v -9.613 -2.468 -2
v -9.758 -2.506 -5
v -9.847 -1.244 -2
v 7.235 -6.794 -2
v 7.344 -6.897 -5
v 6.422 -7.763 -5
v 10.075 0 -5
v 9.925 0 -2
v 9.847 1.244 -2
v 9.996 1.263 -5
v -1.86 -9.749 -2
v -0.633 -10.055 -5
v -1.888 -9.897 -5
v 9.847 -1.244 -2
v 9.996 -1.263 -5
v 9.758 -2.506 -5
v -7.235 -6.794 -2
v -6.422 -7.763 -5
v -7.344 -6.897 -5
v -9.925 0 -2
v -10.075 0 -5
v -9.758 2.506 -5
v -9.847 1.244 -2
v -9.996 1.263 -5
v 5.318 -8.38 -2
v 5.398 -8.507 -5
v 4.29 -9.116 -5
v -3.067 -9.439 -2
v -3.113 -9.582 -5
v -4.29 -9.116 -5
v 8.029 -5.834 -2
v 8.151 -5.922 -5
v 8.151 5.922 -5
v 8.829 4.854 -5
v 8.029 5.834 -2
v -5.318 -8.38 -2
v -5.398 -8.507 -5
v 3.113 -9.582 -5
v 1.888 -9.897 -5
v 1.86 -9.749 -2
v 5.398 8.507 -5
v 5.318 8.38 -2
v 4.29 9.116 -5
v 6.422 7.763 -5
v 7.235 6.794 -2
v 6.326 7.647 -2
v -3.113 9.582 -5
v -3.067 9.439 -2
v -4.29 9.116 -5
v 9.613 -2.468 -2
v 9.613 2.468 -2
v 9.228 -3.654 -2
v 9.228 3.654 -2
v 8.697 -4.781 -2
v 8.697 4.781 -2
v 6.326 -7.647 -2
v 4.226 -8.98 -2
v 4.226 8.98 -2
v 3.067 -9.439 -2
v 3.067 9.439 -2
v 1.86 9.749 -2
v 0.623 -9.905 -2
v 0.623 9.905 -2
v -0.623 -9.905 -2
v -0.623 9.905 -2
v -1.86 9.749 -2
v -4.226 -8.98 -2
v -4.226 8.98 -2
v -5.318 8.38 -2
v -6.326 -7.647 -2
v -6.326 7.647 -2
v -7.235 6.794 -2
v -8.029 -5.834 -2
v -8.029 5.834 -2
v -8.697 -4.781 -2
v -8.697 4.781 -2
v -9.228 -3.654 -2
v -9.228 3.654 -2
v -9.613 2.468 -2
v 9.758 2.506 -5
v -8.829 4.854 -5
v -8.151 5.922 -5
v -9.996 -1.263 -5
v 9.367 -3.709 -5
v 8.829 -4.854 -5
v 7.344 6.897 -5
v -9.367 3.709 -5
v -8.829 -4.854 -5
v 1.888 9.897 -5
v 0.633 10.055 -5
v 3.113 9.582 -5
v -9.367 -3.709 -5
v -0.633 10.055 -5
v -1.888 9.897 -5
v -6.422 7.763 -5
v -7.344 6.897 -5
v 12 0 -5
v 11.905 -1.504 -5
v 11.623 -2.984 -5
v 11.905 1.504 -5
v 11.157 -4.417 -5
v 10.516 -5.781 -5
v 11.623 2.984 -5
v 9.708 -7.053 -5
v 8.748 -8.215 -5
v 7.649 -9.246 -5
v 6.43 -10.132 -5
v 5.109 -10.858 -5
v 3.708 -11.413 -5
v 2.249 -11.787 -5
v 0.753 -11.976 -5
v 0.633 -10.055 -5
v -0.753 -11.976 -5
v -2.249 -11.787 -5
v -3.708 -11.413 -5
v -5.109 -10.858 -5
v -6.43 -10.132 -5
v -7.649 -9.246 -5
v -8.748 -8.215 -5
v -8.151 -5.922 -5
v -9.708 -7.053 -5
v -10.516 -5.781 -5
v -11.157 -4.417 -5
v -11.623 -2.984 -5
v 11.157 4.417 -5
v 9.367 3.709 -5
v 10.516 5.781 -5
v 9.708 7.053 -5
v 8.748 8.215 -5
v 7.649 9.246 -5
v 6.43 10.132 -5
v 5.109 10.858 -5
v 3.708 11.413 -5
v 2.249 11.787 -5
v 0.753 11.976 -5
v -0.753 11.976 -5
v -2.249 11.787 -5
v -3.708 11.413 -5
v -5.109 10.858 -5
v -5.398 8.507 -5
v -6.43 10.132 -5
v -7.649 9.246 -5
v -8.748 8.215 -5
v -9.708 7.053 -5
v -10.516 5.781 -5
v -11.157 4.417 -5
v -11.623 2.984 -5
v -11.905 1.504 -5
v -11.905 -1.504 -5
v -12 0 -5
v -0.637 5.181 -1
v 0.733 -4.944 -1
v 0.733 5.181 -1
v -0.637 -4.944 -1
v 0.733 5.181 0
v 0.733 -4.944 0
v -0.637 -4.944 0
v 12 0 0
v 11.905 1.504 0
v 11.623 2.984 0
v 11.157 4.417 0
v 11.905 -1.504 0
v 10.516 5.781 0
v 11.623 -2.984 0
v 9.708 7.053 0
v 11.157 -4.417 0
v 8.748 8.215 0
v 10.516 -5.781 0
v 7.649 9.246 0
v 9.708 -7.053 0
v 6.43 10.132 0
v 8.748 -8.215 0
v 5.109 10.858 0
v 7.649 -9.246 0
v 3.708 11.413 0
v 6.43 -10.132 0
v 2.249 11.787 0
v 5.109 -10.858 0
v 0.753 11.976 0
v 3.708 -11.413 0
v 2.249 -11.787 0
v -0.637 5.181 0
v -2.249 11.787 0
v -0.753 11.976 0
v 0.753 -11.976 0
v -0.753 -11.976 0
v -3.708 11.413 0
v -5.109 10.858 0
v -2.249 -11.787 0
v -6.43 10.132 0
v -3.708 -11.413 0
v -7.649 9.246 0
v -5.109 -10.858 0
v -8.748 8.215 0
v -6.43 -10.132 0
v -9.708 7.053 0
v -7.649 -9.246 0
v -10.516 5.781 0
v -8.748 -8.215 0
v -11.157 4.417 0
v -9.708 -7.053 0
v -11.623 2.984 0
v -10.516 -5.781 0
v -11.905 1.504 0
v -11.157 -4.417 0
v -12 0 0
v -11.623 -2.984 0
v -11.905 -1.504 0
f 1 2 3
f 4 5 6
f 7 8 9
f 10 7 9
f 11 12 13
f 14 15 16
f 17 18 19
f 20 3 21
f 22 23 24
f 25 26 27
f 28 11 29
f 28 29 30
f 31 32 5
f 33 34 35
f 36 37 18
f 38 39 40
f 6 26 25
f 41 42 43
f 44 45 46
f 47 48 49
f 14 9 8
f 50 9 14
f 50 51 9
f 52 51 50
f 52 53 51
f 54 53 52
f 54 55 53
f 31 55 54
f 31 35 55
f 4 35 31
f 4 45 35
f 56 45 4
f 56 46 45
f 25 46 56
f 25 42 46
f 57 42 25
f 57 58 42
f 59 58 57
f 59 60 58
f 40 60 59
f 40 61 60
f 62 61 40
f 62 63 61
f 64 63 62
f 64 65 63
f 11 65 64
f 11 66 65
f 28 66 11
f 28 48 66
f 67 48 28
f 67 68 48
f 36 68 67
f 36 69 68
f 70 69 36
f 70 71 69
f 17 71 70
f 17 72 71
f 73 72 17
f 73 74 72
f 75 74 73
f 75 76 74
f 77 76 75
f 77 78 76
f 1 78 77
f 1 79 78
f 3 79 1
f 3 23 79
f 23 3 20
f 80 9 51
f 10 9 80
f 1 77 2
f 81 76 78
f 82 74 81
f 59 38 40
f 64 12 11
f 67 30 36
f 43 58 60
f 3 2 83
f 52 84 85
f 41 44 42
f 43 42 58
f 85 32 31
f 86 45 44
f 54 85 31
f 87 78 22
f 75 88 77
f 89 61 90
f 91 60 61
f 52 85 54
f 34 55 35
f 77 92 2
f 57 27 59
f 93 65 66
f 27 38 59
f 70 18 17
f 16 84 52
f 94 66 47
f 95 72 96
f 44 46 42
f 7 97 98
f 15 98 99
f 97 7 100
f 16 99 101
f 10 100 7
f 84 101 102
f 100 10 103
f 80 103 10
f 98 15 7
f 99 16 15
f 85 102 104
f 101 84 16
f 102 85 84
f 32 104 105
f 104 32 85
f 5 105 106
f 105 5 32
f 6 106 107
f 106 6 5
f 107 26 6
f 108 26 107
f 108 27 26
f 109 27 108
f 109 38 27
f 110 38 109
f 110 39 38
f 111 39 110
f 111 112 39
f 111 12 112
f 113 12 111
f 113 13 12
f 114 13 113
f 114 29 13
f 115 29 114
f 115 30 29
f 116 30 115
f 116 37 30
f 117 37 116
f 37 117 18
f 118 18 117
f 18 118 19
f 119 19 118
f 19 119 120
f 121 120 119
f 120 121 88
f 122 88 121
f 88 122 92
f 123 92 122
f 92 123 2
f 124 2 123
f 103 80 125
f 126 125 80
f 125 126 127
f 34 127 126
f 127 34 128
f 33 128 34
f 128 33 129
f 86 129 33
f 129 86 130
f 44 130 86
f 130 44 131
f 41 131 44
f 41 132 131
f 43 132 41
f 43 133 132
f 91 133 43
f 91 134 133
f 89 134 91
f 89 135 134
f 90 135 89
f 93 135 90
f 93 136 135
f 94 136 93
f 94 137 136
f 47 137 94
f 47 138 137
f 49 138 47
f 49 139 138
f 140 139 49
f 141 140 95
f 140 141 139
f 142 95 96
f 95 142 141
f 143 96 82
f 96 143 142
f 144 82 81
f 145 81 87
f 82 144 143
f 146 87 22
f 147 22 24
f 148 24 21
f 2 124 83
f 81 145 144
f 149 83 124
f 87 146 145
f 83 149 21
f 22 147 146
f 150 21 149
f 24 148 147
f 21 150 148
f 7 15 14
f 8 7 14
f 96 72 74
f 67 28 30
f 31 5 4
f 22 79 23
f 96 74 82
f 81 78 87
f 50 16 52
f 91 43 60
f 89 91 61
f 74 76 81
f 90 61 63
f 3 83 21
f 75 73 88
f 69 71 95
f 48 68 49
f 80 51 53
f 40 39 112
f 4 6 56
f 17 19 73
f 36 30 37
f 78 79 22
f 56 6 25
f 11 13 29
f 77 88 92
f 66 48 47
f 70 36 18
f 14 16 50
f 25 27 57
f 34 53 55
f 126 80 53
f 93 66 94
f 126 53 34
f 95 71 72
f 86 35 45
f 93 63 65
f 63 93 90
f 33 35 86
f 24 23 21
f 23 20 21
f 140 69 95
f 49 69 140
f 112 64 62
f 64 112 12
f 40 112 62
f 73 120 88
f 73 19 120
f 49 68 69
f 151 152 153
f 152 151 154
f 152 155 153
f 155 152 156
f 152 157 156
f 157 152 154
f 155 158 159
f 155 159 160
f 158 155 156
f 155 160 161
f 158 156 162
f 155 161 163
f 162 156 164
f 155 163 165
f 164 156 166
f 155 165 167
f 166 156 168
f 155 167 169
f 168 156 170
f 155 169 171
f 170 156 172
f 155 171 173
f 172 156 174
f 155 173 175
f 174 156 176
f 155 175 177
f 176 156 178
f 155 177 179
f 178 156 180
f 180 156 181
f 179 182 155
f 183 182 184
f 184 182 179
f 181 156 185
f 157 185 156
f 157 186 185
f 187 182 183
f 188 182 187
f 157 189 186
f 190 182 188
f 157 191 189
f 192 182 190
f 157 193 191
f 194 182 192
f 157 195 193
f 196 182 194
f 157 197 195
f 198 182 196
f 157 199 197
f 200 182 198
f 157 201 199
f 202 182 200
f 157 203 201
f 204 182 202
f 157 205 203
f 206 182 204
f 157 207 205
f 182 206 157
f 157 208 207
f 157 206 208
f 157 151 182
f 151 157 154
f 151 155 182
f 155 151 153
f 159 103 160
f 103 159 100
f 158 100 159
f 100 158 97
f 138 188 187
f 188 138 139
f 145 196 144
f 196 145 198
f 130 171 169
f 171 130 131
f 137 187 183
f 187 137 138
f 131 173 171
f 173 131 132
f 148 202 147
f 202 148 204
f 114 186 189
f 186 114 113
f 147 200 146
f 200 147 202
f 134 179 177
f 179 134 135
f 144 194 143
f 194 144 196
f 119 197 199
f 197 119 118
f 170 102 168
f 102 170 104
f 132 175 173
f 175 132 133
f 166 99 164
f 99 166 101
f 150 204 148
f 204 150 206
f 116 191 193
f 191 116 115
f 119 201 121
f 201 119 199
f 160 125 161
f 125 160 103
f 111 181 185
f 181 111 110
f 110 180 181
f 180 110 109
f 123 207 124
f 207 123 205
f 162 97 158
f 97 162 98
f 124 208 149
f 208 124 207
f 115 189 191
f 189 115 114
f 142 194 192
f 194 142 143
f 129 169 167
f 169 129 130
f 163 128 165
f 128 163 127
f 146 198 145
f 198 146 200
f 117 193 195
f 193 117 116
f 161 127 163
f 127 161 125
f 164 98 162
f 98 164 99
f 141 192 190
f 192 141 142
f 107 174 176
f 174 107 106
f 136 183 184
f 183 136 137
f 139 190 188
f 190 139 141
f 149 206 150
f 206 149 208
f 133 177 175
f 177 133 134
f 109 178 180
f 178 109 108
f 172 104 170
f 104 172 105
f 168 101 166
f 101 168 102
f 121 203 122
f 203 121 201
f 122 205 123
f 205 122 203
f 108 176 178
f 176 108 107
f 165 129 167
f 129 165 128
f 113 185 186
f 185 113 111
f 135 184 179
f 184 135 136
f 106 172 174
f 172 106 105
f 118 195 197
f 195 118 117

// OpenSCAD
$fn = 50;


difference() {
	union() {
		translate(v = [0, 0, -5.0000000000]) {
			cylinder(h = 5, r = 12.0000000000);
		}
	}
	union() {
		#translate(v = [0, 0, -5.0000000000]) {
			cylinder(h = 3, r1 = 10.0750000000, r2 = 9.9250000000);
		}
		translate(v = [0, 0, -1]) {
			linear_extrude(height = 1) {
				text(font = "Impact", halign = "center", size = 10, text = "I", valign = "center");
			}
		}
	}
}
